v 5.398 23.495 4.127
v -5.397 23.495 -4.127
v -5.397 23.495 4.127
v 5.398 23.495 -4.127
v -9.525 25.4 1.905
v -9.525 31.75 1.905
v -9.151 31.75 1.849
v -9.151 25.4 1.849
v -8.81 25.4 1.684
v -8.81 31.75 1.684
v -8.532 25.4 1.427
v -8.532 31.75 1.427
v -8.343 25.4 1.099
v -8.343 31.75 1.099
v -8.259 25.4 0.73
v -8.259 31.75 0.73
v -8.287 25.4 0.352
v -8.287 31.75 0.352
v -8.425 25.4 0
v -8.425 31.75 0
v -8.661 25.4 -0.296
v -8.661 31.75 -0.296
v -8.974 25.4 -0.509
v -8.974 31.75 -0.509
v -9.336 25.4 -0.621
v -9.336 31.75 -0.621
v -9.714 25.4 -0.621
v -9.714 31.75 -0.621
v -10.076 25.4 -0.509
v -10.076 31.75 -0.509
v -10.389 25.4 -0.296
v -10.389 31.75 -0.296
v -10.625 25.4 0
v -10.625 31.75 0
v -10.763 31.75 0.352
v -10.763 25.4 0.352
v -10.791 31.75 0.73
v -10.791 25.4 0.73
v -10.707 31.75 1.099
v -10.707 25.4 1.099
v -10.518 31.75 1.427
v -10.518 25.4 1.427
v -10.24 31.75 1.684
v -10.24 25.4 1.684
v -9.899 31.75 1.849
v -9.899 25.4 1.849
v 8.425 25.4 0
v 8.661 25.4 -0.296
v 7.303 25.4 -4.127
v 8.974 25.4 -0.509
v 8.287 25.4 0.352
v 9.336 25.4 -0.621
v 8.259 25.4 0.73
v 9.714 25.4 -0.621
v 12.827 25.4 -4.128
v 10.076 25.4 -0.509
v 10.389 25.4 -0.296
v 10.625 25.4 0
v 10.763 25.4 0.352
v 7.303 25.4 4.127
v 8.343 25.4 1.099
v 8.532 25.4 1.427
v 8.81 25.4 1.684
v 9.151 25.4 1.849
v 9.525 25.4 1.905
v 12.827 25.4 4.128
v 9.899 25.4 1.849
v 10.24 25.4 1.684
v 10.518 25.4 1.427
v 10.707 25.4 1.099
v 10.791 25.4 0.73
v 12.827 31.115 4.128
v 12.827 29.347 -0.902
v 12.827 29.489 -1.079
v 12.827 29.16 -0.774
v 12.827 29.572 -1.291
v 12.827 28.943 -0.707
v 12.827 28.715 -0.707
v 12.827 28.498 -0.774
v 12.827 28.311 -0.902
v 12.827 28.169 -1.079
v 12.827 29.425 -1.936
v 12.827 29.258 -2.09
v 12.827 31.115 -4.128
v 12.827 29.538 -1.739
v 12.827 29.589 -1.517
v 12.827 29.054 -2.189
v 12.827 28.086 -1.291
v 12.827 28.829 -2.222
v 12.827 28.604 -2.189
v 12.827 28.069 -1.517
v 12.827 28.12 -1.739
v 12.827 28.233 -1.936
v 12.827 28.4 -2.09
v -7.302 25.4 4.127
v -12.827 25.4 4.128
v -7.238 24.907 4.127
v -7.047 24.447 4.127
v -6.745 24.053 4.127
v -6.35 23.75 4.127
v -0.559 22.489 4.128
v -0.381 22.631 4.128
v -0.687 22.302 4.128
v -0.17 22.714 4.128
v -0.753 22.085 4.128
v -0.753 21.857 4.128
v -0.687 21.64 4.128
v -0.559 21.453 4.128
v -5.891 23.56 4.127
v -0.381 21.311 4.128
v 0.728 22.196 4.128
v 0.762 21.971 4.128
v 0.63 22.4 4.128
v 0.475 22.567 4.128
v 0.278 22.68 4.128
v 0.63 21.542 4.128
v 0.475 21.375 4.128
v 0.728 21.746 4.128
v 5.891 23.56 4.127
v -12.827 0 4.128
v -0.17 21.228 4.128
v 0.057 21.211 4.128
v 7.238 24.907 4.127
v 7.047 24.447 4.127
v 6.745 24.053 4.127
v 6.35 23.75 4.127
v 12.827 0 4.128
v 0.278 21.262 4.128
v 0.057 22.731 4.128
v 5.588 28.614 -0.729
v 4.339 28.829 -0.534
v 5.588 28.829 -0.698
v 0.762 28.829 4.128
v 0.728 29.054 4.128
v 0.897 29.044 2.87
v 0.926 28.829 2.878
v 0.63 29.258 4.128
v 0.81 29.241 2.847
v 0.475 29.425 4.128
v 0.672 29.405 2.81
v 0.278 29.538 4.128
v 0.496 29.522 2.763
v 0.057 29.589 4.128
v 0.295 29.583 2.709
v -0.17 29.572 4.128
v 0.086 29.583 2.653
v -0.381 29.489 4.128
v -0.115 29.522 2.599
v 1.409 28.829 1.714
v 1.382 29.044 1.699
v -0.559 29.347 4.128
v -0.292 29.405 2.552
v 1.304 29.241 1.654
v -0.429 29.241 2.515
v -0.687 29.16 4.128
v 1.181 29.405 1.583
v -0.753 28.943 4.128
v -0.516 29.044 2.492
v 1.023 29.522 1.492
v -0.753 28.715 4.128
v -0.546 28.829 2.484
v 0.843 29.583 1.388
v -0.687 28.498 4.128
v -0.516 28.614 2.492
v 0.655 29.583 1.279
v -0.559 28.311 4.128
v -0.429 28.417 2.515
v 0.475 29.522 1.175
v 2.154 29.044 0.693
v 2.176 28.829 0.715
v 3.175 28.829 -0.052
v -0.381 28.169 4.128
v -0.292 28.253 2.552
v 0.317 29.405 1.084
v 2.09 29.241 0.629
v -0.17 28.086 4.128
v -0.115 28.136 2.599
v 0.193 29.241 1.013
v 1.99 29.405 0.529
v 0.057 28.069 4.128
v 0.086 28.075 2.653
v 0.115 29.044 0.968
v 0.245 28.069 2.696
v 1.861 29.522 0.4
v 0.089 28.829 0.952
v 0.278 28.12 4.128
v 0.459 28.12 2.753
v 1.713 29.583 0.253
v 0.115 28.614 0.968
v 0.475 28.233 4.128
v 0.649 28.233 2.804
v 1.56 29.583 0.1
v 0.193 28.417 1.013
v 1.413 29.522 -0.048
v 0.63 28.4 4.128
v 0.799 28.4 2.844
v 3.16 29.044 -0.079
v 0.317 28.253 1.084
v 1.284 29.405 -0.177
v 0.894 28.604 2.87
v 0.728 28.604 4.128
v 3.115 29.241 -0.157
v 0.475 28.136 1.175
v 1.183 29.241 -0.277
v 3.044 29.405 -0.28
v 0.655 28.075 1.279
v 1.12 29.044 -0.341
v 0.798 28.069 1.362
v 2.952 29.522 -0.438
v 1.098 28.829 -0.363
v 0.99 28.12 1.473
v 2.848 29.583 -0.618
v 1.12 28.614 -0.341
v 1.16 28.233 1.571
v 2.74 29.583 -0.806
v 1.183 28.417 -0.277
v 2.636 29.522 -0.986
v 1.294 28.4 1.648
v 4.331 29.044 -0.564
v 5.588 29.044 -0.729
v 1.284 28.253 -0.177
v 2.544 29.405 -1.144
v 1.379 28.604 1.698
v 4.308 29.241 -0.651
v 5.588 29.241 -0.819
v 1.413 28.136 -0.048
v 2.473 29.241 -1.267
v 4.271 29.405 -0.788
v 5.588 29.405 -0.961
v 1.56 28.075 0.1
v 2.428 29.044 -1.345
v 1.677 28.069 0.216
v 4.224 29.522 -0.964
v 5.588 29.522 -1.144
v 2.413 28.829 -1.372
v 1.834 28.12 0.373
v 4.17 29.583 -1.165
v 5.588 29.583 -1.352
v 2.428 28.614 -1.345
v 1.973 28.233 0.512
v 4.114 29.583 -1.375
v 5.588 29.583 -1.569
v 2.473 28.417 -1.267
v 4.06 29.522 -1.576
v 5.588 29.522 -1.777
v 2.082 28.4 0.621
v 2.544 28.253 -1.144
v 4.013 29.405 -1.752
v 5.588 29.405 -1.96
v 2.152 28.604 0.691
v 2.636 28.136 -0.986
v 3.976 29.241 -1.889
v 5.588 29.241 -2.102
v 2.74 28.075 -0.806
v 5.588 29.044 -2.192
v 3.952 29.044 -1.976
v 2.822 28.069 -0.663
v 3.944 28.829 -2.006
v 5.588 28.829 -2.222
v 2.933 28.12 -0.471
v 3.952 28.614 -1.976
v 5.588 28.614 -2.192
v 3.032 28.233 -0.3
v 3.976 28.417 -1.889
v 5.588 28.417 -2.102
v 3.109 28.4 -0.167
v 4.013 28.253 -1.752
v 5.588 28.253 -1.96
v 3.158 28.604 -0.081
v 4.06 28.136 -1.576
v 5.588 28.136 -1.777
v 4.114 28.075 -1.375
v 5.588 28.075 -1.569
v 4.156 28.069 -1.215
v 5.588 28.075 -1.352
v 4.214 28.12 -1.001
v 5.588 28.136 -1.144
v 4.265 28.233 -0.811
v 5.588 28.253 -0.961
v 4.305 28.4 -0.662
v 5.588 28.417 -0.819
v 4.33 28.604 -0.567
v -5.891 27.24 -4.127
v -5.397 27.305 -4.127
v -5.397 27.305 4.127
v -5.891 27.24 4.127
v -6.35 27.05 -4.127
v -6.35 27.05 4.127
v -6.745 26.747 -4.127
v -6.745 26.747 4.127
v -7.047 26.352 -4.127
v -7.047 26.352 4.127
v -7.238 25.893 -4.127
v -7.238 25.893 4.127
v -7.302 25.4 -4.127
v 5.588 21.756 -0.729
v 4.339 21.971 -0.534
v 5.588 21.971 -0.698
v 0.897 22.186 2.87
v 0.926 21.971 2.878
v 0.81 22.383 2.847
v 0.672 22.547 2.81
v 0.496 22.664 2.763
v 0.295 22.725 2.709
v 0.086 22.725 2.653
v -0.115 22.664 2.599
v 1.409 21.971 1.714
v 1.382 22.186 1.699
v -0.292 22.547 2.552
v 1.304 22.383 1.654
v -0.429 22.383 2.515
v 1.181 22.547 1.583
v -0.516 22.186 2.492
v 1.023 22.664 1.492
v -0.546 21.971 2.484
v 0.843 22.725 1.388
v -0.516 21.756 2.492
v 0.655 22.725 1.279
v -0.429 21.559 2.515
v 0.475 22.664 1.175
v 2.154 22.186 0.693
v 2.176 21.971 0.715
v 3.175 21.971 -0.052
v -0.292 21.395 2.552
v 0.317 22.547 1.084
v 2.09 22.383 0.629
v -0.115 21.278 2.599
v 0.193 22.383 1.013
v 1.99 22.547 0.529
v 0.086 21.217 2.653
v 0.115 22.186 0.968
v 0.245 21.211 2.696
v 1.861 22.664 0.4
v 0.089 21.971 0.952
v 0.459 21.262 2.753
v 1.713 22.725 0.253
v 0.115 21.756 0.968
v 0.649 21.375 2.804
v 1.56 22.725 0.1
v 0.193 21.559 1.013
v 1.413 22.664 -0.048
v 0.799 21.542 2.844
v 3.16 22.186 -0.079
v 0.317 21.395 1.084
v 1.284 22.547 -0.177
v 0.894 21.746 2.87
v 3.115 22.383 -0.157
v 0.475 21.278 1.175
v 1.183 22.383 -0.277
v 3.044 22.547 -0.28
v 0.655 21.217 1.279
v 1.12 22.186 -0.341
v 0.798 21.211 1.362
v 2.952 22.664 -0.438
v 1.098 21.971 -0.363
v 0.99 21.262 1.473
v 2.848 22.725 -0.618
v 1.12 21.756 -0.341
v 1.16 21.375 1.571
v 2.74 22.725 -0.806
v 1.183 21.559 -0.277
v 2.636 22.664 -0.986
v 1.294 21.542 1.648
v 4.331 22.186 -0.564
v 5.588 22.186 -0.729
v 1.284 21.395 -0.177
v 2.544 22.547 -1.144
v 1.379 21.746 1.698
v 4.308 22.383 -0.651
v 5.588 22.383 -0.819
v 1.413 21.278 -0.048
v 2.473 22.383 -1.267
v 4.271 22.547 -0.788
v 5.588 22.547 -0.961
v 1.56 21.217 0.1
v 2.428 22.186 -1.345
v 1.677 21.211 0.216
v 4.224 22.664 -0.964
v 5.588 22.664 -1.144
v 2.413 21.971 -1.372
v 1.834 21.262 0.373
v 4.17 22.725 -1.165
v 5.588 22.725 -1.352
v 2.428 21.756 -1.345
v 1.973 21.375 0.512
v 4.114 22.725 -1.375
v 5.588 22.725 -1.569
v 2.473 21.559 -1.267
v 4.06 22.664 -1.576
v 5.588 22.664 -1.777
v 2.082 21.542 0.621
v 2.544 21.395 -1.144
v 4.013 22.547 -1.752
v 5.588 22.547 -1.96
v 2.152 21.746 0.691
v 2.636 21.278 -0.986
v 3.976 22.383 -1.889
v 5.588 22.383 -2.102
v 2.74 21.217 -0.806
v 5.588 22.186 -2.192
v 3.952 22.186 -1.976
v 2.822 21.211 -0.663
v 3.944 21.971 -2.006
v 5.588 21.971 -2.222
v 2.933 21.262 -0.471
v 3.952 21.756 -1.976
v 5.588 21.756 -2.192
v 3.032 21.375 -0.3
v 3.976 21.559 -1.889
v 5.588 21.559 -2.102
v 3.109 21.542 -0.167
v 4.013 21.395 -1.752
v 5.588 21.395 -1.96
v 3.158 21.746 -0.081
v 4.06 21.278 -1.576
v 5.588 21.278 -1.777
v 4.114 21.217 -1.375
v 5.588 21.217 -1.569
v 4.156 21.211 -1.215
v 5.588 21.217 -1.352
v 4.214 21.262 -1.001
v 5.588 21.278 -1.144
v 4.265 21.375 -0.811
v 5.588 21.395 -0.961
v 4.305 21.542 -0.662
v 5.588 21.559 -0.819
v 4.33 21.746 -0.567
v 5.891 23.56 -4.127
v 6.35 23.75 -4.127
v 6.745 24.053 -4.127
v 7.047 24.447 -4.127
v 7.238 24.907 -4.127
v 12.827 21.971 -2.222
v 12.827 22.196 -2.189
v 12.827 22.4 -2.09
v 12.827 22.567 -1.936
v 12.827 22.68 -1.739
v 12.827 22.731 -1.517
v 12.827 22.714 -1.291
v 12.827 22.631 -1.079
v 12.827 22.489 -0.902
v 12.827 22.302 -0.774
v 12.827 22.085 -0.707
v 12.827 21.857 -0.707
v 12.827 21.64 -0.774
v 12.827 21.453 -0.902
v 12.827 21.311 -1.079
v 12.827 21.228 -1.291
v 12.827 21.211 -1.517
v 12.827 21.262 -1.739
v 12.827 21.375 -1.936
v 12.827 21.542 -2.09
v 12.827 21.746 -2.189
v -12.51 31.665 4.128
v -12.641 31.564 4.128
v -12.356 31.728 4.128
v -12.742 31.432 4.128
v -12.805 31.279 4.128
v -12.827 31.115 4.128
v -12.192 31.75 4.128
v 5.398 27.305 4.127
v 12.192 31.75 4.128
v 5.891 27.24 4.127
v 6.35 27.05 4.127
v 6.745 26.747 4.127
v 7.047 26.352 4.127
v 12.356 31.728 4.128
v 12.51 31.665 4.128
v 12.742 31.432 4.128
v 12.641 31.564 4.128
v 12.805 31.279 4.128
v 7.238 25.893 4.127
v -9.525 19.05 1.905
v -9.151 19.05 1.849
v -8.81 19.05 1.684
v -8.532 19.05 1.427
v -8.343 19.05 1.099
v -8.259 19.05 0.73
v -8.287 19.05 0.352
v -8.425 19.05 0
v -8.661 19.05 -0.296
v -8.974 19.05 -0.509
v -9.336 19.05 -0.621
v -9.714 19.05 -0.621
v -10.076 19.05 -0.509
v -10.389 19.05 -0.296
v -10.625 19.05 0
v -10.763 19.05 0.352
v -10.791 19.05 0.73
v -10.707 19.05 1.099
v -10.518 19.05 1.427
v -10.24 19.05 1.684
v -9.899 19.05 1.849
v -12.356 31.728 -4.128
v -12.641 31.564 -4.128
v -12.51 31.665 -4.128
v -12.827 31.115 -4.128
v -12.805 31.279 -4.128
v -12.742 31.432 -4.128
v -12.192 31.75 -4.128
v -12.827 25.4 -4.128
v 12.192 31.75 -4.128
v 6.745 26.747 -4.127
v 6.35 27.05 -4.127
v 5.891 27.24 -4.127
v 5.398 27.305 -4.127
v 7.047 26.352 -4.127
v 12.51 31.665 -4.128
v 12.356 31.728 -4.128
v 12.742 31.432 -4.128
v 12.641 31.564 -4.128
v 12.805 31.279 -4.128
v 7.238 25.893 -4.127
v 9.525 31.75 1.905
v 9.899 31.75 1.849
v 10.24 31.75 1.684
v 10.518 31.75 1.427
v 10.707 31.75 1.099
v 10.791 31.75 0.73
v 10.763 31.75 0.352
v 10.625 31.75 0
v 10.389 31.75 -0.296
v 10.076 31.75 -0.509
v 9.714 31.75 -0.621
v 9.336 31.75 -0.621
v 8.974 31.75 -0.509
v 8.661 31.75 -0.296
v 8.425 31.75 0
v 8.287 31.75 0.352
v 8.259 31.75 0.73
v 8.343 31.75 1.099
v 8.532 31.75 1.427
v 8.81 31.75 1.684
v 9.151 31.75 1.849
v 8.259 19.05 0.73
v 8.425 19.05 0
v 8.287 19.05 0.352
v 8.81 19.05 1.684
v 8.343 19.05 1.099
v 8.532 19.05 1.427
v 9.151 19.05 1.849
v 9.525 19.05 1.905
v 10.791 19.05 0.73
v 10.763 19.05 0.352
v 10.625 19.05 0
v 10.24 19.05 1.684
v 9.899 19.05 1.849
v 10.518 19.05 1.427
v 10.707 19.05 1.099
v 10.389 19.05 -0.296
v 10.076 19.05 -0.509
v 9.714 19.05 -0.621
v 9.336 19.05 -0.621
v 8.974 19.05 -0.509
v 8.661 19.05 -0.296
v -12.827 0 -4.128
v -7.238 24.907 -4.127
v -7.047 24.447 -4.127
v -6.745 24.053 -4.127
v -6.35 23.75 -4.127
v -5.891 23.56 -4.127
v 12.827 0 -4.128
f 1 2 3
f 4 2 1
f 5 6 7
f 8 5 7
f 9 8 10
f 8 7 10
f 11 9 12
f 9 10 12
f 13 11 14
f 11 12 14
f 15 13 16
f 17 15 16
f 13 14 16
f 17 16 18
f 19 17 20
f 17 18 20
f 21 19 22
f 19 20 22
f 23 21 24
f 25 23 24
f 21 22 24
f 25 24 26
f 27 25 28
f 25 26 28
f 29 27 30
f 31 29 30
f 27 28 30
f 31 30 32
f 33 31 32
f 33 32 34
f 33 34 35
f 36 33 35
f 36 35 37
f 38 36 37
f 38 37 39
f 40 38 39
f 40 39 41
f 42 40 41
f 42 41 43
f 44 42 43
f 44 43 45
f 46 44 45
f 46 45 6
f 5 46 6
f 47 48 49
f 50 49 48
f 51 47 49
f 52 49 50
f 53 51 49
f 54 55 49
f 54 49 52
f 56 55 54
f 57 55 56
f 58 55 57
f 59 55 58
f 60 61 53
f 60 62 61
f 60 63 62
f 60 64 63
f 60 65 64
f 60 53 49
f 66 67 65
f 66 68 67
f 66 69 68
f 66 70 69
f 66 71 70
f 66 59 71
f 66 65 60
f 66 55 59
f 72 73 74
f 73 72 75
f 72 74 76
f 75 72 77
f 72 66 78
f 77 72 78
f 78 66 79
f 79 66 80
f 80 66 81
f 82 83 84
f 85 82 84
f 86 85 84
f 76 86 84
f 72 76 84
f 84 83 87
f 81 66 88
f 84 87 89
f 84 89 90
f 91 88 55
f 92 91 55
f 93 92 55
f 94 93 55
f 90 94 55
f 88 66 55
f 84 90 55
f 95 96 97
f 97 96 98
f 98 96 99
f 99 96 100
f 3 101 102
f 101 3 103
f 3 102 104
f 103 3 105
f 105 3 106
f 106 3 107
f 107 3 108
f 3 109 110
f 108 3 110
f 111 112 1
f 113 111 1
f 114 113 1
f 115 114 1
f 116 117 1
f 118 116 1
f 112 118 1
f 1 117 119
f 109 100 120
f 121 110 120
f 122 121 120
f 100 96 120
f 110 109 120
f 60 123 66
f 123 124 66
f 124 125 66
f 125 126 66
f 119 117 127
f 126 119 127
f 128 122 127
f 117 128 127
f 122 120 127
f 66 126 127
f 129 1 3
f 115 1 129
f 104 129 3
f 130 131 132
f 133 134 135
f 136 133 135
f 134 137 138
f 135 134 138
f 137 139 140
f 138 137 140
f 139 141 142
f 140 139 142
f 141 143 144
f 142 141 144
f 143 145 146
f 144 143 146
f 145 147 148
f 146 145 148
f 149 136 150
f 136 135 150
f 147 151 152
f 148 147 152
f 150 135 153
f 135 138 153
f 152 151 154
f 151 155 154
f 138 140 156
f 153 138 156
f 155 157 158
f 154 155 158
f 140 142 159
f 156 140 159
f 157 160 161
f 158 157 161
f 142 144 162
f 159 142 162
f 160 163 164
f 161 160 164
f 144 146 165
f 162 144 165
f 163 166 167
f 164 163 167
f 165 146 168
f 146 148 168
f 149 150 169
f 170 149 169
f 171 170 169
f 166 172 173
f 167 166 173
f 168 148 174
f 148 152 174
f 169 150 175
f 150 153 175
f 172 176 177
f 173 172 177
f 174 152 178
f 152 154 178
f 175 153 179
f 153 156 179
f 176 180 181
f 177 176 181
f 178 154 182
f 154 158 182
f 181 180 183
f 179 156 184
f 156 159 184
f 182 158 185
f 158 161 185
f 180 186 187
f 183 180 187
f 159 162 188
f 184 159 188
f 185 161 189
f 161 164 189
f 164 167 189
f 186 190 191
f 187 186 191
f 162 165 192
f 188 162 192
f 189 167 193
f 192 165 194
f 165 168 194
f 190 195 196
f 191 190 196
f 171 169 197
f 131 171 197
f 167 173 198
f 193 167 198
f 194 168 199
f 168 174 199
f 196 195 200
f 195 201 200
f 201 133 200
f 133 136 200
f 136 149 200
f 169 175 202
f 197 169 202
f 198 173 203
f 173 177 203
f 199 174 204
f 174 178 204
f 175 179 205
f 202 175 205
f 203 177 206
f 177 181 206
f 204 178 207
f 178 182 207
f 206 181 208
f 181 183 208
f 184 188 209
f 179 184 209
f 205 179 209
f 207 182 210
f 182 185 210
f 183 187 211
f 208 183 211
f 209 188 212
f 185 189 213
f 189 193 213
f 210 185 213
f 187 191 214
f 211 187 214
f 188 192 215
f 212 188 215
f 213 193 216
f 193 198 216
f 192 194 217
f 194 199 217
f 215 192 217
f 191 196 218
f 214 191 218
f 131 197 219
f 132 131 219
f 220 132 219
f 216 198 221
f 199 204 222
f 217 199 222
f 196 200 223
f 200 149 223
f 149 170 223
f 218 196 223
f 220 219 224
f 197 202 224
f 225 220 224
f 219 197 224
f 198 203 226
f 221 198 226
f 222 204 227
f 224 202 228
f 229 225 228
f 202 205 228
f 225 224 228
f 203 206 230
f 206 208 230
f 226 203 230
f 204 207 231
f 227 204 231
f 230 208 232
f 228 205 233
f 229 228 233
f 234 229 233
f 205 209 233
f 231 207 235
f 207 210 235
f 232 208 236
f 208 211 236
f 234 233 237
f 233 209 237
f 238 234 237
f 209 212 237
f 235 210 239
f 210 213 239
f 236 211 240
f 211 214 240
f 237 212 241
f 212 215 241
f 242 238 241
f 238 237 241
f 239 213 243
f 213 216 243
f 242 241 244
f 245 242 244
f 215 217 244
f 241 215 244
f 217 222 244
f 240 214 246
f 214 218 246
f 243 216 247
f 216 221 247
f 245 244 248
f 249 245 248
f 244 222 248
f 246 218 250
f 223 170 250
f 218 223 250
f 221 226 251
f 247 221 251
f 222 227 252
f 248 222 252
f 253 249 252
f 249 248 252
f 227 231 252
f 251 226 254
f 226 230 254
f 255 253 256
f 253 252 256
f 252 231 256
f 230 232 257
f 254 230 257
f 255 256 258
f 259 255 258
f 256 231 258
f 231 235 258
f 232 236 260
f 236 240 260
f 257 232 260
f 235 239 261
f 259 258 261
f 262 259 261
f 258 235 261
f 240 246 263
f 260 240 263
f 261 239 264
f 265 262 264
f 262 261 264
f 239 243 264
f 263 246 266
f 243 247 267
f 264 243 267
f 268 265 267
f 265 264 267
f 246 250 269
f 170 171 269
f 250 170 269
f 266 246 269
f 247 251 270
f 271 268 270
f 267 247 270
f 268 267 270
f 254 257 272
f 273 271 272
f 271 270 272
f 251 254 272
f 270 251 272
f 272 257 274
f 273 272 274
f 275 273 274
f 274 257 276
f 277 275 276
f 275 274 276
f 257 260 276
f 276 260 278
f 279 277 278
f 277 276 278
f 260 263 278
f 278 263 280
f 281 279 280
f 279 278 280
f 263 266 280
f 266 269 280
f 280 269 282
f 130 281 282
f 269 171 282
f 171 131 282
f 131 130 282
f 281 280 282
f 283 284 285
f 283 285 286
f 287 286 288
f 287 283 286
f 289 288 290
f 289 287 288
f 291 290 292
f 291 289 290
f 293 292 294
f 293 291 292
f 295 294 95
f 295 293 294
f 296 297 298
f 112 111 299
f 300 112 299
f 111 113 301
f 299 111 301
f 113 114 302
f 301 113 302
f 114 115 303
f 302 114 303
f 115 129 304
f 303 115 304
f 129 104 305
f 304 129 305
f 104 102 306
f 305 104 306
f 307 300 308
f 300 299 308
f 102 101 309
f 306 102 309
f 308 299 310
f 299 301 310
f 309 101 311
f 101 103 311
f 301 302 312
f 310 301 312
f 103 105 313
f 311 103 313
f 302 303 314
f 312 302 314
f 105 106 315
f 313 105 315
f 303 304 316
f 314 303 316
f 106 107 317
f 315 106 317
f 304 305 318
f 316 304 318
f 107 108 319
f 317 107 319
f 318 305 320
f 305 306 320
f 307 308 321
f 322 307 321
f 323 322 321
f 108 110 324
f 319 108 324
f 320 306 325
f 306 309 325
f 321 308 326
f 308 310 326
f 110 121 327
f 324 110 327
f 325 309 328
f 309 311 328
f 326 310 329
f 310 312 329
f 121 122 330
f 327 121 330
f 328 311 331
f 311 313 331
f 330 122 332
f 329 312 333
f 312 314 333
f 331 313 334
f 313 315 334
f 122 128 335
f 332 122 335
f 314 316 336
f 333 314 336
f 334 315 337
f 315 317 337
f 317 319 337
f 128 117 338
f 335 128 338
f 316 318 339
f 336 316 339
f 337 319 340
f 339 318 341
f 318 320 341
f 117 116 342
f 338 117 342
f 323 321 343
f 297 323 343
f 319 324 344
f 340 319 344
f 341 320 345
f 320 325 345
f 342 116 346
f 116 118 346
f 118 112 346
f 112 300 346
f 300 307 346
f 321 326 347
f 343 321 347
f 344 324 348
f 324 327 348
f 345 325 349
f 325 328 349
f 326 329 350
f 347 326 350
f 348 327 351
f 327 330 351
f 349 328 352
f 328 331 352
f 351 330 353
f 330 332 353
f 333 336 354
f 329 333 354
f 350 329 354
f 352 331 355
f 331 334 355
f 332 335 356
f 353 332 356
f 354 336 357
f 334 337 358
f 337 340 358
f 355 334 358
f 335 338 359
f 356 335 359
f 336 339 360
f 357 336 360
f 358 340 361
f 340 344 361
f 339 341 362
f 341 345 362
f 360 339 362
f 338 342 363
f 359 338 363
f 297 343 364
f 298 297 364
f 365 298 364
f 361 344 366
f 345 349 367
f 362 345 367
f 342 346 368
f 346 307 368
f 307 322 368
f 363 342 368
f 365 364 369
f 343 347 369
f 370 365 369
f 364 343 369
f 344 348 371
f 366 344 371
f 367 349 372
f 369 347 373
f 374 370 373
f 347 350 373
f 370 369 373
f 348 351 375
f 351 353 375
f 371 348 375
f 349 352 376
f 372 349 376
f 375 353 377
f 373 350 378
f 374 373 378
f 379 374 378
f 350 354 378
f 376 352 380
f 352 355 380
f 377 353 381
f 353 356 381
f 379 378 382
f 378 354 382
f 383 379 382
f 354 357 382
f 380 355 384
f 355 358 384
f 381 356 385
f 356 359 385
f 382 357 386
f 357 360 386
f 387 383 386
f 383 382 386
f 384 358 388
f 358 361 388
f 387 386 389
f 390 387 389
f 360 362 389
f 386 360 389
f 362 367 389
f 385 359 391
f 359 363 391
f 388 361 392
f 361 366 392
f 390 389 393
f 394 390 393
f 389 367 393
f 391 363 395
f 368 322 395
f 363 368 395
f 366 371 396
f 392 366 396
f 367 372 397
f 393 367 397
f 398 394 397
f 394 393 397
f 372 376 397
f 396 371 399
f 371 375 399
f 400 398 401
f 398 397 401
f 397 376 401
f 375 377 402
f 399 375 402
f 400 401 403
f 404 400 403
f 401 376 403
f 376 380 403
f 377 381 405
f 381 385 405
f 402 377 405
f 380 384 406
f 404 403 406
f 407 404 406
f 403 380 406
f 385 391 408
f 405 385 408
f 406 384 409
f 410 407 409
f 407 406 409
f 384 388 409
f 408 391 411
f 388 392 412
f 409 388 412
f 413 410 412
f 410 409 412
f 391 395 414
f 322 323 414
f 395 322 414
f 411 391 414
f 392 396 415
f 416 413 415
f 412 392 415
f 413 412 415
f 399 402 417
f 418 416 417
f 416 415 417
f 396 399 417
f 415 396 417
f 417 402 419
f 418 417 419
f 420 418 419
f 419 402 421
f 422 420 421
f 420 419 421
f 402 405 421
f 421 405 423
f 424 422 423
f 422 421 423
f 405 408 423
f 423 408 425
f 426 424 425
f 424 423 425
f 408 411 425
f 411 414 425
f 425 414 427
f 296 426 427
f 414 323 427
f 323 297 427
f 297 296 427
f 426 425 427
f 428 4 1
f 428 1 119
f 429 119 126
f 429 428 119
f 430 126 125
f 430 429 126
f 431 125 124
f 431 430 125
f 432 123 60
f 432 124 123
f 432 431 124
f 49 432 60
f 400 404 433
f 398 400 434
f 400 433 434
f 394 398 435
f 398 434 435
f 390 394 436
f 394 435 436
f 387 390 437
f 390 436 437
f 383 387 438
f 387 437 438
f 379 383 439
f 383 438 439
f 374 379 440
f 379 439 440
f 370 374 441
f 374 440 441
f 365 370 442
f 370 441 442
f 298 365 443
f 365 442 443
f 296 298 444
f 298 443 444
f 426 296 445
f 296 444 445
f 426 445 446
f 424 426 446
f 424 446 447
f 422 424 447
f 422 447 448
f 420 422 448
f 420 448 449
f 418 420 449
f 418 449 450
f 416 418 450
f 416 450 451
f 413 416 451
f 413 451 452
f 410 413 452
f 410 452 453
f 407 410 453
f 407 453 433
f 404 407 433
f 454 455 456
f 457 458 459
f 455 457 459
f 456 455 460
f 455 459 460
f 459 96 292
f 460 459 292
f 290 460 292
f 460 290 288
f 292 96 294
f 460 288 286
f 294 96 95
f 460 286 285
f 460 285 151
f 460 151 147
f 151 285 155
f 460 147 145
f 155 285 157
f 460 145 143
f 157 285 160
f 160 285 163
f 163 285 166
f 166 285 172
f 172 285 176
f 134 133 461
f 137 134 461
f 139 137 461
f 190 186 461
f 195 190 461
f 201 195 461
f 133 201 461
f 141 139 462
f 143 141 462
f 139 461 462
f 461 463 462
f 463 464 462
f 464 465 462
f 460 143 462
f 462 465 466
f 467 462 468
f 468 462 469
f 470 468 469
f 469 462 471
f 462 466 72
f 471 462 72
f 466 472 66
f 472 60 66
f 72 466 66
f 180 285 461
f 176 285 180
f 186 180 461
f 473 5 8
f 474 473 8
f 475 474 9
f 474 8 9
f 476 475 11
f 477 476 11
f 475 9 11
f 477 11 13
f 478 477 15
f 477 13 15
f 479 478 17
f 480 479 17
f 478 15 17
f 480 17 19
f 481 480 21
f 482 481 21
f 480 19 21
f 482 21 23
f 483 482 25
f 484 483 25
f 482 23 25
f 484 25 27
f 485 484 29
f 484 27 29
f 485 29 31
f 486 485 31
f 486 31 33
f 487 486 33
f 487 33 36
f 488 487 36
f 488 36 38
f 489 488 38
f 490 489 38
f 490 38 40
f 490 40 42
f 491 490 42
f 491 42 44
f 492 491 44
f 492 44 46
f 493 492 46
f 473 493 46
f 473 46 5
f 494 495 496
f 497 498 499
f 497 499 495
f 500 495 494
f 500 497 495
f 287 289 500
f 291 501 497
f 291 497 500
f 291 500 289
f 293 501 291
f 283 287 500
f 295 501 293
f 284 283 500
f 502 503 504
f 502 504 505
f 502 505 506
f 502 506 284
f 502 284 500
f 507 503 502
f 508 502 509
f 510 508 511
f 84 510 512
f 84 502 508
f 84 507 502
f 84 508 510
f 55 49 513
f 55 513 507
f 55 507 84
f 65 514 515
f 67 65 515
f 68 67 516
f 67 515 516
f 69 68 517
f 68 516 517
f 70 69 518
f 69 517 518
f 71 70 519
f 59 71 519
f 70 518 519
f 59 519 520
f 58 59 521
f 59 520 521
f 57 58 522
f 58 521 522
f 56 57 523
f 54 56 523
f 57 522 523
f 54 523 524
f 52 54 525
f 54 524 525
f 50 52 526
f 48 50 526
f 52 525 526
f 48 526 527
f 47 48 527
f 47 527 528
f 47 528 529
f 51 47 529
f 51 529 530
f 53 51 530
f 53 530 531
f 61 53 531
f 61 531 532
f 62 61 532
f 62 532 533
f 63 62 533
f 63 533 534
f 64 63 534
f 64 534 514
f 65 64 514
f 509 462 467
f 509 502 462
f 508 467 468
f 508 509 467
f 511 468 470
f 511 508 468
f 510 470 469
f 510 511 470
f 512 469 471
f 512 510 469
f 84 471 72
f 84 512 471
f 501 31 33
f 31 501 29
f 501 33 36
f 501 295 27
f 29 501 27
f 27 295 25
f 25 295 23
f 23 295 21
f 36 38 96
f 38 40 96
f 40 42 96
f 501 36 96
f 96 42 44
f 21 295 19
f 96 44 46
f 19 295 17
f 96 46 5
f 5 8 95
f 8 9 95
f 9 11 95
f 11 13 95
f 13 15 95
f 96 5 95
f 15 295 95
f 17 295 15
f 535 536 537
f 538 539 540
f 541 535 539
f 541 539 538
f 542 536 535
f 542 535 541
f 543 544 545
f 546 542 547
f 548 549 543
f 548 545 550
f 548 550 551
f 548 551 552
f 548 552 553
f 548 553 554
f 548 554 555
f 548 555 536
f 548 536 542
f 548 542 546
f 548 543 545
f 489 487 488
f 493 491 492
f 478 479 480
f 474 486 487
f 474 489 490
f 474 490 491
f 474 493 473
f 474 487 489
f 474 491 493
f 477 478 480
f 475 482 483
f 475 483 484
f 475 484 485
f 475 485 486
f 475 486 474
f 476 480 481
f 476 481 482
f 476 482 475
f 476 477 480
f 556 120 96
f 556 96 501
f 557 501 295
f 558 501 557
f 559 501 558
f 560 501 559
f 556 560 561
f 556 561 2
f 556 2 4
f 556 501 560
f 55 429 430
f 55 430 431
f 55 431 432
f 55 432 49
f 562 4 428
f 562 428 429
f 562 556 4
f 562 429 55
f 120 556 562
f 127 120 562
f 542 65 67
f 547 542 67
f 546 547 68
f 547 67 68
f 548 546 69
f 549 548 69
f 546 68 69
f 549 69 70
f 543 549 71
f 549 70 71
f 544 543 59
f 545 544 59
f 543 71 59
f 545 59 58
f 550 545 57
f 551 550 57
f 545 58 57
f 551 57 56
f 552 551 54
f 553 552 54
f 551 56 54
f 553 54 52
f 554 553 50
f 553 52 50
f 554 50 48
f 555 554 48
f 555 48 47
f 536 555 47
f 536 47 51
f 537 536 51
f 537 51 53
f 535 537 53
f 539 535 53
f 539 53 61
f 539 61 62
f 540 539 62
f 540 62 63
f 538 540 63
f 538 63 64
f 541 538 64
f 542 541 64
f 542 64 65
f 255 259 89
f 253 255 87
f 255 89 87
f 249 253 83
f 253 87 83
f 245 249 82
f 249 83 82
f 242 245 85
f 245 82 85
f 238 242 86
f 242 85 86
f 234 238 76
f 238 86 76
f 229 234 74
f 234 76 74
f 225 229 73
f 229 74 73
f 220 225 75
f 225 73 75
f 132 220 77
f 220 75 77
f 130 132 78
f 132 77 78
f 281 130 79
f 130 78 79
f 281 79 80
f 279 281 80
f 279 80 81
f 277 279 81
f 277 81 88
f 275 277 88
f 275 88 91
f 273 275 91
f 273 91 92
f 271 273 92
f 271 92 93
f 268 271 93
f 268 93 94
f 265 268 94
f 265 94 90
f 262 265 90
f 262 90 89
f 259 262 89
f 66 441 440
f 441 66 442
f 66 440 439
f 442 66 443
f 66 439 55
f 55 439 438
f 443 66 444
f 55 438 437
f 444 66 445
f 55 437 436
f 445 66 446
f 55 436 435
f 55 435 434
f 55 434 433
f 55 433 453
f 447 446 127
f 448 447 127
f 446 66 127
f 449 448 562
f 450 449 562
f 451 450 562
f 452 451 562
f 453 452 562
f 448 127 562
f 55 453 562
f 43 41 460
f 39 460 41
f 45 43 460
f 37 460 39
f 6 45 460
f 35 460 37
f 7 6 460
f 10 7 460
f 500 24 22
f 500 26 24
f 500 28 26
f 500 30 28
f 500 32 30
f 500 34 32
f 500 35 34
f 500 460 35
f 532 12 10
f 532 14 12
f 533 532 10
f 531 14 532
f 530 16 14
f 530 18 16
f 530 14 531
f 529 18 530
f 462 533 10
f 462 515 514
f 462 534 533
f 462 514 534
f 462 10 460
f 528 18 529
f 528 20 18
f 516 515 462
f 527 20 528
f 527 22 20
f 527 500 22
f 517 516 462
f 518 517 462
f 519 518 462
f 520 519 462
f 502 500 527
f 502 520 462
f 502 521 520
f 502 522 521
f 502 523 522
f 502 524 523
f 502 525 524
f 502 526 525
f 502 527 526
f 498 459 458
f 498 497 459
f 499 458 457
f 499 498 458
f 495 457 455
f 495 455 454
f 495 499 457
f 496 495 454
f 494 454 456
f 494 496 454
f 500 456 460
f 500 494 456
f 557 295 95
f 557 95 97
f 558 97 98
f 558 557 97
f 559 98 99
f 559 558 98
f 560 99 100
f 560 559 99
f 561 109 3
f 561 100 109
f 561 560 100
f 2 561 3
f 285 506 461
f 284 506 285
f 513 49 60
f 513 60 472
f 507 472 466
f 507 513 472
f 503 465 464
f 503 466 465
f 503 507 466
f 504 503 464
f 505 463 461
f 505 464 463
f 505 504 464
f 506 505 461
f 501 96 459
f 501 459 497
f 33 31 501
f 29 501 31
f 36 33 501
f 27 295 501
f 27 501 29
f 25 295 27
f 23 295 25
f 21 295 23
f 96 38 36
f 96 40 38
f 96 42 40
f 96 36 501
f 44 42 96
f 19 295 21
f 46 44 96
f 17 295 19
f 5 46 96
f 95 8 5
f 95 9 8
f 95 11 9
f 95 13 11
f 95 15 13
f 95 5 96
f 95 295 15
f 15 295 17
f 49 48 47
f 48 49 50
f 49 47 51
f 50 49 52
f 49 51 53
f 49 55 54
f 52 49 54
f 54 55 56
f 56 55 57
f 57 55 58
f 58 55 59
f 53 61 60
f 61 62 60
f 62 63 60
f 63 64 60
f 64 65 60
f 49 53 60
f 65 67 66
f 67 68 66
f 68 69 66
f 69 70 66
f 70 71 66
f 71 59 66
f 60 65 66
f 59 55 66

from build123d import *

# Parameters (mm, degrees)
SKETCH1_W           = 25.654
SKETCH1_H           = 8.255
BOSS_EXTRUDE1_DEPTH = 31.75
CUT_EXTRUDE1_DEPTH  = 25.4
SKETCH8_R           = 0.762
CUT_REVOLVE1_ANGLE  = 90.0000000000002
CUT_EXTRUDE4_REACH  = 43.027
SKETCH9_R           = 0.7620000000000002
FILLET1_R           = 0.635
SKETCH10_R          = 1.2700000000000014
SKETCH10_R_2        = 1.2699999999999994
CUT_EXTRUDE5_DEPTH  = 12.7


with BuildPart() as part:
    # Sketch1 → Boss-Extrude1 (new body)
    with BuildSketch(Plane(origin=(0, 0, 0), x_dir=(1, 0, 0), z_dir=(0, 1, 0))):
        Rectangle(SKETCH1_W, SKETCH1_H)
    extrude(amount=BOSS_EXTRUDE1_DEPTH)

    # Sketch2 → Cut-Extrude1 (cut)
    with BuildSketch(Plane(origin=(0, 0, -4.1274999999999995), x_dir=(-1, 0, 0), z_dir=(0, 0, -1))):
        with BuildLine():
            Line((5.397499999999999, 23.494999999999997), (-5.397500000000001, 23.494999999999994))
            ThreePointArc((-5.397500000000001, 23.494999999999994), (-7.3025000000000055, 25.399999999999995), (-5.397500000000002, 27.305))
            Line((-5.397500000000002, 27.305), (5.397499999999997, 27.305000000000003))
            ThreePointArc((5.397499999999997, 27.305000000000003), (7.302499999999999, 25.4), (5.397499999999999, 23.494999999999997))
        make_face()
    extrude(amount=-CUT_EXTRUDE1_DEPTH, mode=Mode.SUBTRACT)

    # Sketch8 → Cut-Revolve1 (revolve, cut)
    with BuildSketch(Plane.XY.offset(4.127500000000001)):
        with Locations((0, 28.828999999999994)):
            Circle(SKETCH8_R)
        with Locations((0, 21.97099999999999)):
            Circle(SKETCH8_R)
    revolve(axis=Axis((5.588, 31.75, 4.127500000000001), (0, -1, 0)), revolution_arc=CUT_REVOLVE1_ANGLE, mode=Mode.SUBTRACT)

    # Sketch9 → Cut-Extrude4 (cut, up to next)
    with BuildSketch(Plane(origin=(12.826999999999996, 0, 0), x_dir=(0, 0, -1), z_dir=(1, 0, 0)), mode=Mode.PRIVATE) as cut_extrude4_sk1:
        with Locations((1.4604999999999988, 28.828999999999994)):
            Circle(SKETCH9_R)
    cut_extrude4_tool1 = extrude(cut_extrude4_sk1.sketch, amount=-CUT_EXTRUDE4_REACH, mode=Mode.PRIVATE) & part.part
    # Sketch9 → Cut-Extrude4 (cut, up to next)
    with BuildSketch(Plane(origin=(12.826999999999996, 0, 0), x_dir=(0, 0, -1), z_dir=(1, 0, 0)), mode=Mode.PRIVATE) as cut_extrude4_sk2:
        with Locations((1.4604999999999988, 21.97099999999999)):
            Circle(SKETCH9_R)
    cut_extrude4_tool2 = extrude(cut_extrude4_sk2.sketch, amount=-CUT_EXTRUDE4_REACH, mode=Mode.PRIVATE) & part.part
    add(cut_extrude4_tool1.solids().sort_by_distance((12.827, 28.829, -1.4605))[0], mode=Mode.SUBTRACT)
    add(cut_extrude4_tool2.solids().sort_by_distance((12.827, 21.971, -1.4605))[0], mode=Mode.SUBTRACT)

    # Fillet1
    fillet1_edges = [part.edges().sort_by_distance(p)[0] for p in [
        (-12.827000000000004, 31.75, 8.9e-16),
        (12.826999999999996, 31.75, 8.9e-16),
    ]]
    fillet(fillet1_edges, radius=FILLET1_R)

    # Sketch10 → Cut-Extrude5 (cut)
    with BuildSketch(Plane(origin=(0, 31.75, 0), x_dir=(1, 0, 0), z_dir=(0, 1, 0))):
        with Locations((9.525, -0.635)):
            Circle(SKETCH10_R)
        with Locations((-9.525, -0.635)):
            Circle(SKETCH10_R_2)
    extrude(amount=-CUT_EXTRUDE5_DEPTH, mode=Mode.SUBTRACT)


with BuildPart() as body_2:
    # Split1: the piece on the far side of the plane
    add(part.part)
    split(bisect_by=Plane.ZX.offset(25.4), keep=Keep.BOTTOM)


with BuildPart() as part_1:
    add(part.part)

    # Split1
    split(bisect_by=Plane.ZX.offset(25.4), keep=Keep.TOP)


solid = Compound([body_2.part, part_1.part])
